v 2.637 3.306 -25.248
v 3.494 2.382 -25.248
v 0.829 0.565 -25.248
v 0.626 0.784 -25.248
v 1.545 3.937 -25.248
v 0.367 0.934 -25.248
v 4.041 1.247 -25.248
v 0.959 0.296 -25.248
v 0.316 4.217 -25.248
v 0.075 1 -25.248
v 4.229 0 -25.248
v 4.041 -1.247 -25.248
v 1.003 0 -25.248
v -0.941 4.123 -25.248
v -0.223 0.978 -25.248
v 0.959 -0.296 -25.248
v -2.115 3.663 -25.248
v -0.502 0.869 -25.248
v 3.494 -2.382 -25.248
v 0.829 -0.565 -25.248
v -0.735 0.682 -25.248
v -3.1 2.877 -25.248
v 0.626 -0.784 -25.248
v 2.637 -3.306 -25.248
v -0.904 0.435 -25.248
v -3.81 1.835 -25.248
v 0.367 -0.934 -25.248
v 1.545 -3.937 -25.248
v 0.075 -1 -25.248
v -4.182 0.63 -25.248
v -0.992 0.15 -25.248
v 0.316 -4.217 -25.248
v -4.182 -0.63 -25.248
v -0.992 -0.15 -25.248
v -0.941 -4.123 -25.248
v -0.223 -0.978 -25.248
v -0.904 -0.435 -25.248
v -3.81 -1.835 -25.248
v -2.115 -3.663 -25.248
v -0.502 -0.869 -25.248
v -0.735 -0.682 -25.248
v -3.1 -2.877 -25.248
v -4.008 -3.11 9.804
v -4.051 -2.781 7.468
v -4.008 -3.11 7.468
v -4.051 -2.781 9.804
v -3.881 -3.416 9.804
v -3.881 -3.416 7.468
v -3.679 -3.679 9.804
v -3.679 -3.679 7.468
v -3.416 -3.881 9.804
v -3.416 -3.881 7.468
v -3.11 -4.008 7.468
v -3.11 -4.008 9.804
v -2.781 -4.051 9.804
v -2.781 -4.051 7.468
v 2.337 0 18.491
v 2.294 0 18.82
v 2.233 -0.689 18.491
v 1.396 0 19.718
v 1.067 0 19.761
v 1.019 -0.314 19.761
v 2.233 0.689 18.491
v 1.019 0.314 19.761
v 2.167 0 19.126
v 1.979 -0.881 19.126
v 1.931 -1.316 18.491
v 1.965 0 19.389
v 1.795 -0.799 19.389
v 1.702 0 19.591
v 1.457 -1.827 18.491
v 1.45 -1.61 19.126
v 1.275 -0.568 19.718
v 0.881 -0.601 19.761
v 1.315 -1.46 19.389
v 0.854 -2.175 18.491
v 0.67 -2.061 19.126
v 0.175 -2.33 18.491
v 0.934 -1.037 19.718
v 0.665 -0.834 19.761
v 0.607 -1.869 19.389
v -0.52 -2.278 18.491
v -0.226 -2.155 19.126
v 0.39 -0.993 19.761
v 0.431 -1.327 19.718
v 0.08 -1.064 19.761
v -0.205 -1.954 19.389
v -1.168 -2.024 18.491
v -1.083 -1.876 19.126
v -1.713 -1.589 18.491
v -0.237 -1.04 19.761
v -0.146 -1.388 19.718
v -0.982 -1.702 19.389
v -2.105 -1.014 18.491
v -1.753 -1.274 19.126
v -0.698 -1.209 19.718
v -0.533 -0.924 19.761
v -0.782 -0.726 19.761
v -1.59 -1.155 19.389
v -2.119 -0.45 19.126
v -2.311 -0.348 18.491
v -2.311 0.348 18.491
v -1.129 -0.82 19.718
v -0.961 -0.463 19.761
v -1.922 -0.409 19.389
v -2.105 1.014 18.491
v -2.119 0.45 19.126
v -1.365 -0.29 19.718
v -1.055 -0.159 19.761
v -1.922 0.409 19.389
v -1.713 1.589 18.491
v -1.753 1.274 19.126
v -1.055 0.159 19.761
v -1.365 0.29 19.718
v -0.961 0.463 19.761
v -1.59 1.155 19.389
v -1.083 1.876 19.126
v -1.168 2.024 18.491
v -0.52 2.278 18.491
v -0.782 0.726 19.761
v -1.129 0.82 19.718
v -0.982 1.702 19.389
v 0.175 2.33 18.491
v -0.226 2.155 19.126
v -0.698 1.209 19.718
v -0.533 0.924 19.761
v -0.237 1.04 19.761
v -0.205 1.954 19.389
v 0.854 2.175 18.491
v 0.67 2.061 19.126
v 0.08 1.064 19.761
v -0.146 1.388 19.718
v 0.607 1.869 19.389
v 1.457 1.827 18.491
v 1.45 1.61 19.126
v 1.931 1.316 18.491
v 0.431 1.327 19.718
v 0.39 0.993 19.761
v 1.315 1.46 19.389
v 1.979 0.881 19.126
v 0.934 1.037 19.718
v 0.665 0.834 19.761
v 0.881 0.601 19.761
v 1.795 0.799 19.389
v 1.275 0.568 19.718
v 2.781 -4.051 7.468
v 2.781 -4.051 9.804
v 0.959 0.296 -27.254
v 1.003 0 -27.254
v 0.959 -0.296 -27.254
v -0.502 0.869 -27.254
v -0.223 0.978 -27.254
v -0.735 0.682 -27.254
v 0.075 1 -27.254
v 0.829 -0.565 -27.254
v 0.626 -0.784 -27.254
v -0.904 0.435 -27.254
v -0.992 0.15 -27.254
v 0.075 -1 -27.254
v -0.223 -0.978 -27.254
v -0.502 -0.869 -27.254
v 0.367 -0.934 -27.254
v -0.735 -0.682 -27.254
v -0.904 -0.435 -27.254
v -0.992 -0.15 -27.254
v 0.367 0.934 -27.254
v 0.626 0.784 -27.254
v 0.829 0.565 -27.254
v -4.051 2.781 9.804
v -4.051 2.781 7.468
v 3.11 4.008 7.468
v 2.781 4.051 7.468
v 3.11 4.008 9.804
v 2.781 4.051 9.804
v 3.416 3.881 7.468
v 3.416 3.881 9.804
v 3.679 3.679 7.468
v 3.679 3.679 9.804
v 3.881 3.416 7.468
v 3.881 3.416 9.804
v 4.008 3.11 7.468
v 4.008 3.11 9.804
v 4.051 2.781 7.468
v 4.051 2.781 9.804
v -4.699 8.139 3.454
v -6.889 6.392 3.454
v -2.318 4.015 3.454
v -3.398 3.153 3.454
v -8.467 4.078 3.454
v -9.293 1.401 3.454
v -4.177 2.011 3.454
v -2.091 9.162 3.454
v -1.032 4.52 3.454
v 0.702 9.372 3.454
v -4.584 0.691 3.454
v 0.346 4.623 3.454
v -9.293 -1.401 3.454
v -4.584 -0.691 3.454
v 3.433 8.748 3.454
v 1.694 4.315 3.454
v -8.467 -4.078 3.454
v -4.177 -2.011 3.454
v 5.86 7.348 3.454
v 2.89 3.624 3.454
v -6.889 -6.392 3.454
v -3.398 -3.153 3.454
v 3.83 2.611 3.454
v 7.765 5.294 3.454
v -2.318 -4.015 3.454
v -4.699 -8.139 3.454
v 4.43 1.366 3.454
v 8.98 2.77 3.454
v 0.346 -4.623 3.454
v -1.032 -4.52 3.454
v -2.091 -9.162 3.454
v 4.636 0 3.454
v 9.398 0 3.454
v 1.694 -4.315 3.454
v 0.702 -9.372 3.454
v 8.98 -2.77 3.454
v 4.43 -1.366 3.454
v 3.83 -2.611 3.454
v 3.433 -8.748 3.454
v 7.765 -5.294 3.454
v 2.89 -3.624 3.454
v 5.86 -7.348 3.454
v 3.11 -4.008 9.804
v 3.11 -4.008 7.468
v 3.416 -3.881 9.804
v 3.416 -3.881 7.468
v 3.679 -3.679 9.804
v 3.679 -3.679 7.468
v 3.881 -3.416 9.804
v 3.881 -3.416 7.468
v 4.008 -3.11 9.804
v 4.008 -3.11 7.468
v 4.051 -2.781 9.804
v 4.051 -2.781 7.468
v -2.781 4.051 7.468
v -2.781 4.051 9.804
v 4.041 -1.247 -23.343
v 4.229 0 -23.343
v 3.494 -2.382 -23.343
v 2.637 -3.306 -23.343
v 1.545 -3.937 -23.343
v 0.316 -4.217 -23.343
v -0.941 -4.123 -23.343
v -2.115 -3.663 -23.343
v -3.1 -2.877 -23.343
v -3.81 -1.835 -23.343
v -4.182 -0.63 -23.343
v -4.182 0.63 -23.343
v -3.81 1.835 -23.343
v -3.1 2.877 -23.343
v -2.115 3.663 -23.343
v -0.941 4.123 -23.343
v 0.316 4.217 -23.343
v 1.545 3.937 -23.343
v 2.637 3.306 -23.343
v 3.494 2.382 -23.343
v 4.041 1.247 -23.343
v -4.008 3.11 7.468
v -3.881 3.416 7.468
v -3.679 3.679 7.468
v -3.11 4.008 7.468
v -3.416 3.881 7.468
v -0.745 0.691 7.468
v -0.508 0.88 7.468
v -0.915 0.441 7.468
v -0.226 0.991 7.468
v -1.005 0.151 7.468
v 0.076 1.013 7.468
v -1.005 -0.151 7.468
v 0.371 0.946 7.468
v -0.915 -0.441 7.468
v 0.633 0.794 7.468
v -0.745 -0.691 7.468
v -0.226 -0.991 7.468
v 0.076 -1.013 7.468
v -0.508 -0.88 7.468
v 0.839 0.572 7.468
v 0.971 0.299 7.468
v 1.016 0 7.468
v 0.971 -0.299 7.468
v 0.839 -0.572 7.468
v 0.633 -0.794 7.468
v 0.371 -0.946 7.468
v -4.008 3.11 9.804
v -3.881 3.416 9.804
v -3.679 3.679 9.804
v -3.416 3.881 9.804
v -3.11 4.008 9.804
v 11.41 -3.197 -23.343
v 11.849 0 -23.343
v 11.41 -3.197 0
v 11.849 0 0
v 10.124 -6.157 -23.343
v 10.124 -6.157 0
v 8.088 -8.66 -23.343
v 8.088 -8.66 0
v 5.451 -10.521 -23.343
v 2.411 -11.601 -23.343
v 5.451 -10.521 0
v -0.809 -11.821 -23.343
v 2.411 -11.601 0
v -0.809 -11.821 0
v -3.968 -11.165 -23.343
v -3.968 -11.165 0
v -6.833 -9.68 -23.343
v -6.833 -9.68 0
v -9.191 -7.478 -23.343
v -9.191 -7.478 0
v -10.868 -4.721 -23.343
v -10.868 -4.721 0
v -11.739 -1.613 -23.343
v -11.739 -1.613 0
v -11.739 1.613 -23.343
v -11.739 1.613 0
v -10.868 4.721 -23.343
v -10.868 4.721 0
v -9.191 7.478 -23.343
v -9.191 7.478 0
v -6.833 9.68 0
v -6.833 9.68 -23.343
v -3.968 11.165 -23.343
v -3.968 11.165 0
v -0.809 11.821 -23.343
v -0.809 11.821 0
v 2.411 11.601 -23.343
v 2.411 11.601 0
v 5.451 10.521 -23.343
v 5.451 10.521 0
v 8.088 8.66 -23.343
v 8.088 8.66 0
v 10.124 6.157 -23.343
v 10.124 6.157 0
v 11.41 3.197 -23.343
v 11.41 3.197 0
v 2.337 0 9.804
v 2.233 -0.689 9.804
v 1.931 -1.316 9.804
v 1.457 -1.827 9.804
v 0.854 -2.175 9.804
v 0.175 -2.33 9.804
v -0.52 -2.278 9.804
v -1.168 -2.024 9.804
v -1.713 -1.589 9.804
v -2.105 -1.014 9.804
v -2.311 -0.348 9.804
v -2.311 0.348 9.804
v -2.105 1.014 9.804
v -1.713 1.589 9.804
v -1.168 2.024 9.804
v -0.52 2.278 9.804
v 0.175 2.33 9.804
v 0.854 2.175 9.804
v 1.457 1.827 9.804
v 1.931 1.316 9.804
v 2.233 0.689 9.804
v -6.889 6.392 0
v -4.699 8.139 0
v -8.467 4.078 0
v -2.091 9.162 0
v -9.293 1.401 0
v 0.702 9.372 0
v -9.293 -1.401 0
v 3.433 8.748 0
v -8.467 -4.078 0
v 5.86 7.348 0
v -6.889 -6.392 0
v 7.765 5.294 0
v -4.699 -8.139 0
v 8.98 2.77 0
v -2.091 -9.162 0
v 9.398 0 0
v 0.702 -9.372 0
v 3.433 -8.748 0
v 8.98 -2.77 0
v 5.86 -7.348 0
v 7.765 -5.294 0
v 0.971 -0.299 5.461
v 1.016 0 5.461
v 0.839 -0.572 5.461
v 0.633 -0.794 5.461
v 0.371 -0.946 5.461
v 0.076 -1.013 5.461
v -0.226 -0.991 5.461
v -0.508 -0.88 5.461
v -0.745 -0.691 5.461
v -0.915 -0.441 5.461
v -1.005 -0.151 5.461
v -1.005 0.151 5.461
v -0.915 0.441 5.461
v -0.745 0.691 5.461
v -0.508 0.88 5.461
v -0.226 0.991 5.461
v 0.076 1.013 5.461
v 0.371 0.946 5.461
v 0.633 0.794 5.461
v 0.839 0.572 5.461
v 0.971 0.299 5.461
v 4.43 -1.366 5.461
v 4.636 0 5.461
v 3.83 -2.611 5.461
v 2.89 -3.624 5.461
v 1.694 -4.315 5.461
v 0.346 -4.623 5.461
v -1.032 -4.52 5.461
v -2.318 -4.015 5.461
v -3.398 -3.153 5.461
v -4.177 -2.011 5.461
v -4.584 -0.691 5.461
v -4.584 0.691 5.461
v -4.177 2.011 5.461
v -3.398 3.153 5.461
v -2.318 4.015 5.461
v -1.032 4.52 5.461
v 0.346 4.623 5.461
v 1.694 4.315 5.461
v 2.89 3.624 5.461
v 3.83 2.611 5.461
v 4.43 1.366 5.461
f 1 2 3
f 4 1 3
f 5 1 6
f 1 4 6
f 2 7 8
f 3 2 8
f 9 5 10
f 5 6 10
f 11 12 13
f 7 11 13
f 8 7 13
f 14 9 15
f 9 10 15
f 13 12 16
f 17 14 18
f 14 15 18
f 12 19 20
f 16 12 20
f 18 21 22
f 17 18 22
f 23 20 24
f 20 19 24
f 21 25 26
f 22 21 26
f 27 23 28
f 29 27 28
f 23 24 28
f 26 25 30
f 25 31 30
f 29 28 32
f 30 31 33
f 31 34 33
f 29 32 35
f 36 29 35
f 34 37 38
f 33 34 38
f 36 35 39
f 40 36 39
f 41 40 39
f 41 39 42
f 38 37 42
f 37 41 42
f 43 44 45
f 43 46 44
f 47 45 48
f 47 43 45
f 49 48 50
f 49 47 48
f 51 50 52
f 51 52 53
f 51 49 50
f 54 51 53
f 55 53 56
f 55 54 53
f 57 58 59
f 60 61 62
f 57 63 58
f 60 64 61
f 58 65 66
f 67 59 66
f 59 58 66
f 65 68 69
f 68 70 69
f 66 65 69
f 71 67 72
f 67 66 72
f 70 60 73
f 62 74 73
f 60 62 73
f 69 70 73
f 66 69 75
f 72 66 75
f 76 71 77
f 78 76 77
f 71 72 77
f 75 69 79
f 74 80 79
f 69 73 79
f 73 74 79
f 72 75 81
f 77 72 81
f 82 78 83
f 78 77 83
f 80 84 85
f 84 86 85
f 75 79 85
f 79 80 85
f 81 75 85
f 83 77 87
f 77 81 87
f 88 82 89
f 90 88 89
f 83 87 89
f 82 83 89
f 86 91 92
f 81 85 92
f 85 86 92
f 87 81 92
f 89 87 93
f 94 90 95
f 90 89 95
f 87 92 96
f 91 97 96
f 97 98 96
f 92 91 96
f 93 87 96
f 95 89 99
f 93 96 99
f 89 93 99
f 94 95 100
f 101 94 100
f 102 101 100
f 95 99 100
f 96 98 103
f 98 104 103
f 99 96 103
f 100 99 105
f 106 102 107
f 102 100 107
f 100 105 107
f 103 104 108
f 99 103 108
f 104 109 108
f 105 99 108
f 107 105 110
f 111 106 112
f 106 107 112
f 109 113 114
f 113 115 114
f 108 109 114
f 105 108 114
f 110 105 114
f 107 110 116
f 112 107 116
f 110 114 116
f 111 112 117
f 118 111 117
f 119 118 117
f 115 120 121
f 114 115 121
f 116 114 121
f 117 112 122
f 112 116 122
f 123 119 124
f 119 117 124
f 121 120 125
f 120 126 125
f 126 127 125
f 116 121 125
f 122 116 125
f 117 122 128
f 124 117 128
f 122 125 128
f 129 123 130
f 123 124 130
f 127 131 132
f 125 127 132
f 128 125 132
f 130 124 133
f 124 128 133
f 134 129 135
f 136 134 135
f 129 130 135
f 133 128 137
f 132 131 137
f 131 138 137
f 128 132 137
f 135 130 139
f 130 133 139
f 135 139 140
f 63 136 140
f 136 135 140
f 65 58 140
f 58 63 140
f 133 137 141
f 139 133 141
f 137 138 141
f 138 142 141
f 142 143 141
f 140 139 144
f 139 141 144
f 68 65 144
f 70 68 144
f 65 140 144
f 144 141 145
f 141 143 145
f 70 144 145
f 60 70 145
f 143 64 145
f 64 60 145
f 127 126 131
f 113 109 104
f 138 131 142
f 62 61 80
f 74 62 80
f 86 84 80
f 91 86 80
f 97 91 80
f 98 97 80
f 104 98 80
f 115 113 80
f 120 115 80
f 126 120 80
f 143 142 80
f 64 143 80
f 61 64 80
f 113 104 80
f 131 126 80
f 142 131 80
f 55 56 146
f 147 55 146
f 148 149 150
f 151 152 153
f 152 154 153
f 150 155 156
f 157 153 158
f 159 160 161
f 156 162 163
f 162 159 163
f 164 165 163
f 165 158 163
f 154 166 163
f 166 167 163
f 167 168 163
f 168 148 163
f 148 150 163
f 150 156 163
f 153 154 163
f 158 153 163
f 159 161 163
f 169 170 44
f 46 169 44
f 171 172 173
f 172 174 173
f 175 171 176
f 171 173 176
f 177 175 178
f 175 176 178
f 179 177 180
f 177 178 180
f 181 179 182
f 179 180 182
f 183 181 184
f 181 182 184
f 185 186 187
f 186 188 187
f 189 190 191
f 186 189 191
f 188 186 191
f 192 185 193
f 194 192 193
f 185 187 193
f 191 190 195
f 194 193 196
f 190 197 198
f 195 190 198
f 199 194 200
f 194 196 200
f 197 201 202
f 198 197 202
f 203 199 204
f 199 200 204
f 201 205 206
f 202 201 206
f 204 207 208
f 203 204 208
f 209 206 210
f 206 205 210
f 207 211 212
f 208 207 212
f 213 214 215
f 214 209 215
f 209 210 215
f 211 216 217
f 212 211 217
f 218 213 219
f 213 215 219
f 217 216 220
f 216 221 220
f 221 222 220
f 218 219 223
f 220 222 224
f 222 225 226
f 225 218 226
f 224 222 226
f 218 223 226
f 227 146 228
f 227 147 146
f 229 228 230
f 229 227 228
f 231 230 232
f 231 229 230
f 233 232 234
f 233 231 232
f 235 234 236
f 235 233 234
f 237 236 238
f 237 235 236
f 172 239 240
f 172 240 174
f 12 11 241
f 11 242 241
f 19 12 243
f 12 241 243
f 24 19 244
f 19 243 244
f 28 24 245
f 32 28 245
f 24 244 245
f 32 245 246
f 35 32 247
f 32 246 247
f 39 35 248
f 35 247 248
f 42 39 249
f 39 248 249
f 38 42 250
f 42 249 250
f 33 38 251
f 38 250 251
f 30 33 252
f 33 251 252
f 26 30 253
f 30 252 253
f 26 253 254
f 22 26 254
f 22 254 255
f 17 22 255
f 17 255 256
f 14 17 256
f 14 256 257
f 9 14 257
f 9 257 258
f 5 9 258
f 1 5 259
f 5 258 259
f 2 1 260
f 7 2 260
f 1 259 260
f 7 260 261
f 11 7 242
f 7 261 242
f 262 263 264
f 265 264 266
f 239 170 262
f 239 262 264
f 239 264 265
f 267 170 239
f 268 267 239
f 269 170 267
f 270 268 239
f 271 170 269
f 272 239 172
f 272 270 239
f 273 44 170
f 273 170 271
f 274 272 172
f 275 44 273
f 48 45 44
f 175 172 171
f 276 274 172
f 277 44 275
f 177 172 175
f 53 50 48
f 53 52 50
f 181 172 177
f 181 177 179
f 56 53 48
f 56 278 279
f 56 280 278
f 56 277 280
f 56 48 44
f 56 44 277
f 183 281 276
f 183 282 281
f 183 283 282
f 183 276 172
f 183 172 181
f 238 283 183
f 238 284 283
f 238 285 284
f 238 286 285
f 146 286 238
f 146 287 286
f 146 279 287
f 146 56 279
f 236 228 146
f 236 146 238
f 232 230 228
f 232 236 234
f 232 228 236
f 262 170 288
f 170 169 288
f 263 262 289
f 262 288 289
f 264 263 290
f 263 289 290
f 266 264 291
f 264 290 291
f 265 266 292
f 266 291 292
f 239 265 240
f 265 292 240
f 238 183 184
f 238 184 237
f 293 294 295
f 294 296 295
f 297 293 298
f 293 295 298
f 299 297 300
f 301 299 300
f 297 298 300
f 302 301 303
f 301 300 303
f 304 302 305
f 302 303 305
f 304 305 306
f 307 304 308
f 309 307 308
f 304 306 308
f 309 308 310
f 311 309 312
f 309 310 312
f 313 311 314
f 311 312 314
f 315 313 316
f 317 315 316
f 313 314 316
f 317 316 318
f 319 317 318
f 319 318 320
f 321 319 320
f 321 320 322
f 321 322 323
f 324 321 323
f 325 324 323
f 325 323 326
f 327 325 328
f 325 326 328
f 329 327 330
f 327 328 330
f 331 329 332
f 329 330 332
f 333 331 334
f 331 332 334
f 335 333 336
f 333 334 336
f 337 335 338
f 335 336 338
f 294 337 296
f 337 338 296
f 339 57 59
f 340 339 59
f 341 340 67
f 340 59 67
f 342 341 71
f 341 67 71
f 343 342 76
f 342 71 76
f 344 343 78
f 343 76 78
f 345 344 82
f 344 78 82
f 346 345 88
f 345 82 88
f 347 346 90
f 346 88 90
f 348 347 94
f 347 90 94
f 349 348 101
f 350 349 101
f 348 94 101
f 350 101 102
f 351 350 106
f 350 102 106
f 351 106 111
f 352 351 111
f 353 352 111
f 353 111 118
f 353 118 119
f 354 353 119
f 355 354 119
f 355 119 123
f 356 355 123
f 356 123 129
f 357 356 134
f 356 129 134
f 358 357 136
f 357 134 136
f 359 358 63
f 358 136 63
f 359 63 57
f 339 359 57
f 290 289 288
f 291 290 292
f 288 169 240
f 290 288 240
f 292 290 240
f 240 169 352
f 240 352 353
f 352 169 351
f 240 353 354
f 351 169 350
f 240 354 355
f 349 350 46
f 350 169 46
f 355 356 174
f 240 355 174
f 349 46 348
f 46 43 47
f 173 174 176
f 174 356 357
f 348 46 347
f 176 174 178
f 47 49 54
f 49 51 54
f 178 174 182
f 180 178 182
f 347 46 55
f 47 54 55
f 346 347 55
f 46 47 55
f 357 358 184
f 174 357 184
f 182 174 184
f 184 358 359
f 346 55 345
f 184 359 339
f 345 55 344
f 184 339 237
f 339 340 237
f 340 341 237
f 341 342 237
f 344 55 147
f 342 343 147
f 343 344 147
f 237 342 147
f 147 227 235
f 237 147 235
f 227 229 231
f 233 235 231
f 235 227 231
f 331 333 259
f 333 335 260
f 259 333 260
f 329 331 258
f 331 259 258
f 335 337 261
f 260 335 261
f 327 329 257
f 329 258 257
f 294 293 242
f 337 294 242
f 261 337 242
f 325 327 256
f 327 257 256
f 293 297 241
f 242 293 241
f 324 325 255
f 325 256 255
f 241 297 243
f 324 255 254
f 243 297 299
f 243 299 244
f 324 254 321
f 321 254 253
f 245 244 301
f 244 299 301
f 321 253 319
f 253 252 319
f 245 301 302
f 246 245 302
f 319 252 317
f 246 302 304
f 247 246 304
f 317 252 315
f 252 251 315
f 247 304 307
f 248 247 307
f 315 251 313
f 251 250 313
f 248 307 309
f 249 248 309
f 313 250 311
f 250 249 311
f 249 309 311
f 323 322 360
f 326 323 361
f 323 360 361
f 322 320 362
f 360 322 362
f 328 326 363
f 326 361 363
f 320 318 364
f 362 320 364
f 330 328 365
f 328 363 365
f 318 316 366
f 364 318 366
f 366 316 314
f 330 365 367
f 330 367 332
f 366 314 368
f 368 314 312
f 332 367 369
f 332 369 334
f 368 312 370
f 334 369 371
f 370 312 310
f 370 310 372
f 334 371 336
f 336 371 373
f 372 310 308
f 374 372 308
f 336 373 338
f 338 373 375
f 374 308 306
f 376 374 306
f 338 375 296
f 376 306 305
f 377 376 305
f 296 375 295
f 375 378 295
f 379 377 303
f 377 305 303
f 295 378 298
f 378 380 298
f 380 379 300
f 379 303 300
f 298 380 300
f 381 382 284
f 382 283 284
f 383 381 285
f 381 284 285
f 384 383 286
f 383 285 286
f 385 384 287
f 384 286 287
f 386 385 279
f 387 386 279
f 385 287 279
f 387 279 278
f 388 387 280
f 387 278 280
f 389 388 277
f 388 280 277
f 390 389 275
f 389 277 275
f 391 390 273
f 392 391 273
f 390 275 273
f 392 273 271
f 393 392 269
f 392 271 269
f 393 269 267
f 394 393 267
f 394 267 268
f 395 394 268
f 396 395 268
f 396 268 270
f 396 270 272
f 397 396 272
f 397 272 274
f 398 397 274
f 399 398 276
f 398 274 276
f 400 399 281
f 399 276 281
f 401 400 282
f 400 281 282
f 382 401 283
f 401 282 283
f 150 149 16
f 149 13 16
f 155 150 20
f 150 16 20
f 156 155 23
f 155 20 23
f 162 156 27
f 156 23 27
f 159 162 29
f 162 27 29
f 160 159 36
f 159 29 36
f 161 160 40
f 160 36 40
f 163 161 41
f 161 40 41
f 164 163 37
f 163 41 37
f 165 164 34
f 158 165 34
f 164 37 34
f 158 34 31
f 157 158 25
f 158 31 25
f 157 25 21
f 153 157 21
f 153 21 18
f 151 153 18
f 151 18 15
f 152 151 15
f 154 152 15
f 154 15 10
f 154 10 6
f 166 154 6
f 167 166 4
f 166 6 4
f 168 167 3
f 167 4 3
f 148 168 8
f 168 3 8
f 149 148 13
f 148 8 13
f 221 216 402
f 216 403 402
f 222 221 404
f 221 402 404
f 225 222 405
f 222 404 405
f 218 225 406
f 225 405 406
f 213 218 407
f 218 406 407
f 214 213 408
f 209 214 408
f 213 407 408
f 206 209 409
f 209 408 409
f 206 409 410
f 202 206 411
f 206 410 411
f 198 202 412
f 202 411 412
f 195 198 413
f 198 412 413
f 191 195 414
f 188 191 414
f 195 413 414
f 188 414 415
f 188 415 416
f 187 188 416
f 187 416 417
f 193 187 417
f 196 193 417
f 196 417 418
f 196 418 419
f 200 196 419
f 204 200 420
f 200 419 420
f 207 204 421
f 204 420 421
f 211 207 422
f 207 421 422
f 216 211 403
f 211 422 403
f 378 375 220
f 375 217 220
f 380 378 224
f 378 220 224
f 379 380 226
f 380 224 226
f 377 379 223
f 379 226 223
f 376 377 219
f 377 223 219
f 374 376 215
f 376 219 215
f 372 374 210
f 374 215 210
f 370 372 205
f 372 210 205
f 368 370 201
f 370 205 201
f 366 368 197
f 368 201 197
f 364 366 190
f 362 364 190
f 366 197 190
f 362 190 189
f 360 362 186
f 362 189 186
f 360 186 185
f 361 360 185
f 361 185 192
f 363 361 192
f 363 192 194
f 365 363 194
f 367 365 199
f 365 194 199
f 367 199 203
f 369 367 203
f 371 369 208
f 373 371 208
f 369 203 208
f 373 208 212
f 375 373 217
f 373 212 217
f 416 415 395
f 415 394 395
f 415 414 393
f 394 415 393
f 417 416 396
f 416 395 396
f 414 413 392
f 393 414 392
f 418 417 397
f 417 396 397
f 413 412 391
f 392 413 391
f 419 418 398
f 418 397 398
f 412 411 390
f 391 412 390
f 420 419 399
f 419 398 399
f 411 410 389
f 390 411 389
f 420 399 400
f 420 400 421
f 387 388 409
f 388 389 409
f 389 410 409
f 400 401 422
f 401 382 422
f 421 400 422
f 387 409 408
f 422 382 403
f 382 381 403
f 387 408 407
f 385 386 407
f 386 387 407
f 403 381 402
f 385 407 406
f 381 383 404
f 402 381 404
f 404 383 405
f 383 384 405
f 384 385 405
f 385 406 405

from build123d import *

# Parameters (mm, degrees)
F2_W     = 8.1026
F2_H     = 8.1026
F2_R     = 2.3368
F3_DEPTH = 2.3368
F4_R     = 1.27
F5_R     = 1.27


with BuildPart() as f1:
    # F0 (on Front) → F1 (revolve)
    with BuildSketch(Plane.XZ):
        Polygon((11.8491, -23.3426), (11.8491, 0), (9.398, 0), (9.398, 3.4544), (4.635883, 3.4544), (4.635883, 5.461), (1.016, 5.461), (1.016, 7.4676), (2.3368, 7.4676), (2.3368, 19.7612), (0, 19.7612), (0, -27.2542), (1.0033, -27.2542), (1.0033, -25.2476), (4.2291, -25.2476), (4.2291, -23.3426), align=None)
    revolve(axis=Axis((0, 0, -3.7465), (0, 0, -1)))

    # F2 (on face) → F3 (join)
    with BuildSketch(Plane(origin=(0, 0, 7.4676), x_dir=(1, 0, 0), z_dir=(0, 0, -1))):
        Rectangle(F2_W, F2_H)
        Circle(F2_R, mode=Mode.SUBTRACT)
    extrude(amount=-F3_DEPTH)

    # F4
    f4_edges = [f1.edges().sort_by_distance(p)[0] for p in [
        (4.0513, -4.0513, 8.636),
        (-4.0513, -4.0513, 8.636),
        (-4.0513, 4.0513, 8.636),
        (4.0513, 4.0513, 8.636),
    ]]
    fillet(f4_edges, radius=F4_R)

    # F5
    f5_edges = [f1.edges().sort_by_distance(p)[0] for p in [
        (-2.3368, 0, 19.7612),
    ]]
    fillet(f5_edges, radius=F5_R)


solid = f1.part
